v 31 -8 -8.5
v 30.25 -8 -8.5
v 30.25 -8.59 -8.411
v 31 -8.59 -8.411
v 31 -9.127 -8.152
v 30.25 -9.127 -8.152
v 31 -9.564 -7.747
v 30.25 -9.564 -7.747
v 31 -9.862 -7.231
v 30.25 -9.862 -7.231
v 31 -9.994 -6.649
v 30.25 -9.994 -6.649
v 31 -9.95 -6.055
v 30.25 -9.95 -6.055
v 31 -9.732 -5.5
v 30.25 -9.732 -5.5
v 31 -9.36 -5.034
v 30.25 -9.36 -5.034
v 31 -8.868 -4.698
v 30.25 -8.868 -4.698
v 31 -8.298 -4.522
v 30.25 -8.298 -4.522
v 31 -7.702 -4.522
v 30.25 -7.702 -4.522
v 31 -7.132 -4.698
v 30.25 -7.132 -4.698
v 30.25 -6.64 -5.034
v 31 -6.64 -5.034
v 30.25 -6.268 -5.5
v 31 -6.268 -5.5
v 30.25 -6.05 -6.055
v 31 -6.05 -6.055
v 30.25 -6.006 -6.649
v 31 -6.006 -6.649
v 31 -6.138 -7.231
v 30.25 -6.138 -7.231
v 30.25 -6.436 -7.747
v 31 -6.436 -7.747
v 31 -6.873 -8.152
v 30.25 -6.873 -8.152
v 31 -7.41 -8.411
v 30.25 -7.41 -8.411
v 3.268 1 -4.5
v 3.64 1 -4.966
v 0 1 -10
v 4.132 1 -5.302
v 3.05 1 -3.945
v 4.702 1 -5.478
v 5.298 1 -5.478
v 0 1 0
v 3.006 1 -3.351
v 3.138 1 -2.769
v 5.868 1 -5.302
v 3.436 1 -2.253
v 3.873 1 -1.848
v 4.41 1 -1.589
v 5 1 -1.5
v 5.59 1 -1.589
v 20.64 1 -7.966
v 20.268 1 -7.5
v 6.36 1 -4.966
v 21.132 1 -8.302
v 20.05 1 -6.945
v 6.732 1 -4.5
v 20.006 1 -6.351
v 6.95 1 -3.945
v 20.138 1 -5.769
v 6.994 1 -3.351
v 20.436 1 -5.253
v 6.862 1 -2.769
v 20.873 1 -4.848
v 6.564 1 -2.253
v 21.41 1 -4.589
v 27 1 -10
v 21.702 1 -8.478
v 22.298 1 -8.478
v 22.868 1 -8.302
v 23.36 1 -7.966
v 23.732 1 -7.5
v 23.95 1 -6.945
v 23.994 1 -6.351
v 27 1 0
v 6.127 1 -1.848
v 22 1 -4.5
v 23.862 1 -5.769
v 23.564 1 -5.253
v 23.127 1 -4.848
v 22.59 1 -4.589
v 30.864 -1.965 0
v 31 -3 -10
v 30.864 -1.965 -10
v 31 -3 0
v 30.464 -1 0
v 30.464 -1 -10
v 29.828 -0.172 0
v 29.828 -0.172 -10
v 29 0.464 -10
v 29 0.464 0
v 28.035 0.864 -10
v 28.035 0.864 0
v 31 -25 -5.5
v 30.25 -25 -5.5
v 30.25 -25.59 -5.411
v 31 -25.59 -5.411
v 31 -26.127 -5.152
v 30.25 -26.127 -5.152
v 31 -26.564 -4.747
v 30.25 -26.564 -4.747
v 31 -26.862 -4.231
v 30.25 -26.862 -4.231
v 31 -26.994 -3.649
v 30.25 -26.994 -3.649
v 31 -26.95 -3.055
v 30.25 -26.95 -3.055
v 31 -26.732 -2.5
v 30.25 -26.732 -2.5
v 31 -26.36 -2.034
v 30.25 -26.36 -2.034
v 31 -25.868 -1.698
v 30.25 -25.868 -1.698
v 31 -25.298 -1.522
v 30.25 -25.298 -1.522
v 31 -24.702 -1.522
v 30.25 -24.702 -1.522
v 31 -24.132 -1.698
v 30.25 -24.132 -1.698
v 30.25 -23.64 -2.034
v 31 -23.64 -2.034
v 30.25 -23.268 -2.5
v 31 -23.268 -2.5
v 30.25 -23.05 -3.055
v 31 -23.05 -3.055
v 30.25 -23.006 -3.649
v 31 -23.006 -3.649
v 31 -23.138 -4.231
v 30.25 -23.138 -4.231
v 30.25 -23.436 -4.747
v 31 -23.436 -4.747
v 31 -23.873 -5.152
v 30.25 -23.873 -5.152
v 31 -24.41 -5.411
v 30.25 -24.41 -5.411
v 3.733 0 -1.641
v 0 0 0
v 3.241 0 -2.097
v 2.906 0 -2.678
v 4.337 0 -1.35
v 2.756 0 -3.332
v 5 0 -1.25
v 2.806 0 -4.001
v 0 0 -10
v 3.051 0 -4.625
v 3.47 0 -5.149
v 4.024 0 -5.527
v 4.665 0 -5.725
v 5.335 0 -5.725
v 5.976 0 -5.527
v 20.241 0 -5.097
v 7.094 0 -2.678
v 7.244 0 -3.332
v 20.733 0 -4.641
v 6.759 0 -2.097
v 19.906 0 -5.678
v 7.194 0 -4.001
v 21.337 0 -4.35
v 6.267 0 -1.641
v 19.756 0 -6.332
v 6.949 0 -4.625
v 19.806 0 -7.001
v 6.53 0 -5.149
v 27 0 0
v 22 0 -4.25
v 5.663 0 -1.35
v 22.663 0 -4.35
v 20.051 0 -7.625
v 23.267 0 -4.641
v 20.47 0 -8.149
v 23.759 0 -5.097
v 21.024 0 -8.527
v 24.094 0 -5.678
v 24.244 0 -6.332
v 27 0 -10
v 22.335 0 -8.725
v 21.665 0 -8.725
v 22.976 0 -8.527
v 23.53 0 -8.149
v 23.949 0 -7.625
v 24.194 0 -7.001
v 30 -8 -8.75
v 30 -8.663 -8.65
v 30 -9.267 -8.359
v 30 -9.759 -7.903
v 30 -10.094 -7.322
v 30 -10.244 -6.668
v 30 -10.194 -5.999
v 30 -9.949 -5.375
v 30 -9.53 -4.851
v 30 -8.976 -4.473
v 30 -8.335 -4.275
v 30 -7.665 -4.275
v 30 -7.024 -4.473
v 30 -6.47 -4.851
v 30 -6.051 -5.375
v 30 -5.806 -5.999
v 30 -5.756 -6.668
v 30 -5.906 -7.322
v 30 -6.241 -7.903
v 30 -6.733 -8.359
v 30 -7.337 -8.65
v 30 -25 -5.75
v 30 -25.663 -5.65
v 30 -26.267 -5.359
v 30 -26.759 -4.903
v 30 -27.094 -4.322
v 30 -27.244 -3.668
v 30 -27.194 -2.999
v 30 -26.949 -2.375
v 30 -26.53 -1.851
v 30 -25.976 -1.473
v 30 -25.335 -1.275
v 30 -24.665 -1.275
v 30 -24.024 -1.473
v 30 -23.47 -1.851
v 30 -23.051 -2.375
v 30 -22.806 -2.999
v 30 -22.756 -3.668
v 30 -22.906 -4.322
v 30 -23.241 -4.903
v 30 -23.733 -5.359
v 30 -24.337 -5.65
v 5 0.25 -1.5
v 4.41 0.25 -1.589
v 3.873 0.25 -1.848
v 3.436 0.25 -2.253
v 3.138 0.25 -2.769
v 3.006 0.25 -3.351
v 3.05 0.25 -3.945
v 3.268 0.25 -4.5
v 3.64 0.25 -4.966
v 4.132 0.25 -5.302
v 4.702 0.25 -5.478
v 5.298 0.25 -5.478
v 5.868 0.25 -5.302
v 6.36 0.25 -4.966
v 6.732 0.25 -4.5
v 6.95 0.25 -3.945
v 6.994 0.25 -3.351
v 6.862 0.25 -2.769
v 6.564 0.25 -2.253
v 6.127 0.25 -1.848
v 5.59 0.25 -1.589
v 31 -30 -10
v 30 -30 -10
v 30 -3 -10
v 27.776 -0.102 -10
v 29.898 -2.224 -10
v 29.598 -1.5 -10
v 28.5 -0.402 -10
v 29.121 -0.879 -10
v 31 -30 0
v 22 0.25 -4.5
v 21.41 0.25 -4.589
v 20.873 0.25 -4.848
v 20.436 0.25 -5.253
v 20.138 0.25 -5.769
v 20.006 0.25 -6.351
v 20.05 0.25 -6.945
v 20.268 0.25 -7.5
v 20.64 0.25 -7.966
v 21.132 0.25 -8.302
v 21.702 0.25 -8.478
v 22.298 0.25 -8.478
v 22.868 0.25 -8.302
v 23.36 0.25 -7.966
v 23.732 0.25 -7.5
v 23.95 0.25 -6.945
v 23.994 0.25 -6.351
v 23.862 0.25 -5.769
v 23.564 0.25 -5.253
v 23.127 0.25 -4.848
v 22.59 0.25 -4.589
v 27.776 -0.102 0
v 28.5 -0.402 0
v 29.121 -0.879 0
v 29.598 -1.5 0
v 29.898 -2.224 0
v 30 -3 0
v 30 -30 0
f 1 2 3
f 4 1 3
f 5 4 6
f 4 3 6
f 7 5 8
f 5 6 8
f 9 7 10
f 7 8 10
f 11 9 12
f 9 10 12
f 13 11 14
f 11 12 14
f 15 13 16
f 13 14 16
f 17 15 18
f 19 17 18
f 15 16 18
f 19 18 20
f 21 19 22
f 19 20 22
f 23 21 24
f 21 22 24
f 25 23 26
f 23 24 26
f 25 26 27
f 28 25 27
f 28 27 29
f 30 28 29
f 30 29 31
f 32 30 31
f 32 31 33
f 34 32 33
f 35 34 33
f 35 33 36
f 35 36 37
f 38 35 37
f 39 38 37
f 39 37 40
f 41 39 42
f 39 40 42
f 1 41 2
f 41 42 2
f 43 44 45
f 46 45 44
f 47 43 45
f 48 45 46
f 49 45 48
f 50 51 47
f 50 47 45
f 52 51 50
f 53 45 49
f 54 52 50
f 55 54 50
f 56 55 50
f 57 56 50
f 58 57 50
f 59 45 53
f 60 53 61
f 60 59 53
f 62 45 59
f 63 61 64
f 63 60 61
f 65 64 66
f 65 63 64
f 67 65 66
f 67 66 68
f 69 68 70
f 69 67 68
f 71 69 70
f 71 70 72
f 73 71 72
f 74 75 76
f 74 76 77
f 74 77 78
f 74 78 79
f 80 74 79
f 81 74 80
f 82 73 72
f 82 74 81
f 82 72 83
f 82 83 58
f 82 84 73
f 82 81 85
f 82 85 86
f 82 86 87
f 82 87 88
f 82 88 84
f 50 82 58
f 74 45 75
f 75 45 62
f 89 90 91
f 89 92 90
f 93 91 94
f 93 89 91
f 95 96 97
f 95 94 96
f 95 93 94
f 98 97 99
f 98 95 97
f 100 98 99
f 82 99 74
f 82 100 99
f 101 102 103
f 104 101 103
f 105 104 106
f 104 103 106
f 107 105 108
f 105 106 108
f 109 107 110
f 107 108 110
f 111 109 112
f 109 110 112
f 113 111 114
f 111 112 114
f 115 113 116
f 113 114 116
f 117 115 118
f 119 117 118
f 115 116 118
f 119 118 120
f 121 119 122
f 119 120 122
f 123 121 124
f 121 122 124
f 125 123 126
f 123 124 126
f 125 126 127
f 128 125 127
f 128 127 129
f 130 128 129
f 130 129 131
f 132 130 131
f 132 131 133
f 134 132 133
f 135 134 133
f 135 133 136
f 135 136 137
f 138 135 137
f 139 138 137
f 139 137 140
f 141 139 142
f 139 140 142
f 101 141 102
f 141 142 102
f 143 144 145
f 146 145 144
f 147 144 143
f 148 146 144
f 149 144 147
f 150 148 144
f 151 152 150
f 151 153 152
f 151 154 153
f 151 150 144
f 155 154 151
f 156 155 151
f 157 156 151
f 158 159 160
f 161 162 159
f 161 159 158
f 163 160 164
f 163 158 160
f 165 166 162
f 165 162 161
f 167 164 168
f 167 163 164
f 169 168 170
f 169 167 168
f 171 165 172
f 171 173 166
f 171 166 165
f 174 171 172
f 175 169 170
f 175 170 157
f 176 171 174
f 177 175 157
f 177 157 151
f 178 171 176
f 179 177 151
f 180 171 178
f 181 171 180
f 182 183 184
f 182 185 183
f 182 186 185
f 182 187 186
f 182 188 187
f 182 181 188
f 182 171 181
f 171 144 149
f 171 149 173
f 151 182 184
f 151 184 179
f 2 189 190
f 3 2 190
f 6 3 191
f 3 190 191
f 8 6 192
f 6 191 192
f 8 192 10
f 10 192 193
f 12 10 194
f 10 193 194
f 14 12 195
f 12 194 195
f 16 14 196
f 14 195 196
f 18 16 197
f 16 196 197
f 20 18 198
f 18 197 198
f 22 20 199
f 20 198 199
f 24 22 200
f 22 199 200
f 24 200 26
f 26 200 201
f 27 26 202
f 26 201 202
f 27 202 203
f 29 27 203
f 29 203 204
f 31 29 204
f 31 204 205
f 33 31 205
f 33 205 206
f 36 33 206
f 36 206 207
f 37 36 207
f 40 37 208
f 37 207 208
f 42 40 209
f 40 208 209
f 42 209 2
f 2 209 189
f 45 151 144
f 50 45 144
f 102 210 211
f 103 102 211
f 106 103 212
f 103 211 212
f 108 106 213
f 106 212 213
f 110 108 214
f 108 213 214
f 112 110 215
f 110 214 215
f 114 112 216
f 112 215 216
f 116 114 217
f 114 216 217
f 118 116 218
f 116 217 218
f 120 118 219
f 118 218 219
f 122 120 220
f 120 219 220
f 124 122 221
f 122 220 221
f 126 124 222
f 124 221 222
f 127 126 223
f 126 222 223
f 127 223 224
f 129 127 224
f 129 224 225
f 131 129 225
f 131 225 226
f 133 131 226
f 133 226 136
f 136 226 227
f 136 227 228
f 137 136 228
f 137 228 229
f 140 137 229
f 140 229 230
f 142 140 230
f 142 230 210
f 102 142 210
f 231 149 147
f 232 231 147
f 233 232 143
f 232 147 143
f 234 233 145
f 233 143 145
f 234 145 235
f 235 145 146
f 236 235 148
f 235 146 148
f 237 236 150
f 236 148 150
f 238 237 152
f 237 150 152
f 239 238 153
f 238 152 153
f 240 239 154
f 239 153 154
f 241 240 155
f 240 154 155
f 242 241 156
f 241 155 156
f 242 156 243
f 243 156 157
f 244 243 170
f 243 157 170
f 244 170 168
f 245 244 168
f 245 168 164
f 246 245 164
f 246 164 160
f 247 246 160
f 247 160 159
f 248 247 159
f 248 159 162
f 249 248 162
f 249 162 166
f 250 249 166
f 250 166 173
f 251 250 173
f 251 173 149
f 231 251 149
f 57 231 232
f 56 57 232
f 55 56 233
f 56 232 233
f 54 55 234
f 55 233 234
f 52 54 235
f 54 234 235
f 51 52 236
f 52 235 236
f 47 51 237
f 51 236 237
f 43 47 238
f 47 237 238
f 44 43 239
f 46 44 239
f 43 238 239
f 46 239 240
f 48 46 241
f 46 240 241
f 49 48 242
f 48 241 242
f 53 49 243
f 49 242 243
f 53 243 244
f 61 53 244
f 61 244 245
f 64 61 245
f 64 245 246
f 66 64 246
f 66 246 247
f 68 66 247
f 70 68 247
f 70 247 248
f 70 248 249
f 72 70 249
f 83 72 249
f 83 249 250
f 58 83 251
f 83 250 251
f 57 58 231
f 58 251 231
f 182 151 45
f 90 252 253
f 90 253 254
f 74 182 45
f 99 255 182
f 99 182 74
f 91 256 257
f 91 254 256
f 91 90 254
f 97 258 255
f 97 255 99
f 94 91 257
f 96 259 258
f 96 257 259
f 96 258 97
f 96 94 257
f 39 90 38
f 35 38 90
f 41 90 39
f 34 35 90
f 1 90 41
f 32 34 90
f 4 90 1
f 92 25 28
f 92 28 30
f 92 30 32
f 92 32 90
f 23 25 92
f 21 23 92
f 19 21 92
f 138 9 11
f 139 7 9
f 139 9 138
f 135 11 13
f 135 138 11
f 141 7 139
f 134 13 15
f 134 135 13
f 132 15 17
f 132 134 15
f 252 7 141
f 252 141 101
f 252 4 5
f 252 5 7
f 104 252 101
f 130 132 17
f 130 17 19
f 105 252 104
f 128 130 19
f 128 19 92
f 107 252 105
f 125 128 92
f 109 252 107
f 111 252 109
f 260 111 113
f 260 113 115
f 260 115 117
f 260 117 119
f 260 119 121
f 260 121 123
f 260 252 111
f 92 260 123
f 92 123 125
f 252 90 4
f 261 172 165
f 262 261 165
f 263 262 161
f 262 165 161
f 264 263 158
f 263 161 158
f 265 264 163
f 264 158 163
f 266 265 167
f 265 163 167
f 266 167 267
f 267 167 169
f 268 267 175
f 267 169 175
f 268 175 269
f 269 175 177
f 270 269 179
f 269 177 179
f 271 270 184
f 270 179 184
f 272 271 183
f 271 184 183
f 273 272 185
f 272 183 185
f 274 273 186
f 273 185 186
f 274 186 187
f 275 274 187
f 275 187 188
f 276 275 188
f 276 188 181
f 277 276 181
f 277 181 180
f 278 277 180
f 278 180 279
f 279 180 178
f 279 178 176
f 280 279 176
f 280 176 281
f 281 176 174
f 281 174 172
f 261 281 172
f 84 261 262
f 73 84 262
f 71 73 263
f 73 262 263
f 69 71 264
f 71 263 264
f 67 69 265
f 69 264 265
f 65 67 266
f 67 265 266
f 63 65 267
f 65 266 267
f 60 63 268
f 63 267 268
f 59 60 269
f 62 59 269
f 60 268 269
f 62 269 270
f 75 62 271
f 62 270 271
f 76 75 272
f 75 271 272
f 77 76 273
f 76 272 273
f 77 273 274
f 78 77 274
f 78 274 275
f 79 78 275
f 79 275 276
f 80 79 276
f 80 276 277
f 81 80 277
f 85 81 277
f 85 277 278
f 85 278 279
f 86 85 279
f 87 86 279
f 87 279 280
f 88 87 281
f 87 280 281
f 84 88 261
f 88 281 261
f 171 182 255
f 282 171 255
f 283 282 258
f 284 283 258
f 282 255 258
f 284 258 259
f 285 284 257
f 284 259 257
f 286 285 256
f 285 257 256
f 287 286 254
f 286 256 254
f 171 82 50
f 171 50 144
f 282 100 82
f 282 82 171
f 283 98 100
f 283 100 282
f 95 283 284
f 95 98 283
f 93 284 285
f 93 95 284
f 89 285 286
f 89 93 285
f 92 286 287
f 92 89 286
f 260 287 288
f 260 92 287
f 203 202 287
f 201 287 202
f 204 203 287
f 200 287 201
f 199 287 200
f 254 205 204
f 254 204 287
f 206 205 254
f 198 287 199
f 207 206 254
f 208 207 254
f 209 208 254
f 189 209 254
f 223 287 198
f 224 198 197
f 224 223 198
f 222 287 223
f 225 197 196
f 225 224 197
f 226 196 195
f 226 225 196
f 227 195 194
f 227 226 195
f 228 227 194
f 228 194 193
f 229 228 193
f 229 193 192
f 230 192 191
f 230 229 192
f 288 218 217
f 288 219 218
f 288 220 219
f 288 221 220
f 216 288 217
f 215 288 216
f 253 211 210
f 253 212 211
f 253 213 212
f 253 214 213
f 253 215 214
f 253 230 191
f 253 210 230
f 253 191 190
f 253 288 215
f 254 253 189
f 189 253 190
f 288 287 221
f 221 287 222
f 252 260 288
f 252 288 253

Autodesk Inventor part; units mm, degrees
ref_plane "YZ Plane" through (0, 0, 0) normal (1, 0, 0) x (0, 1, 0)
ref_plane "XZ Plane" through (0, 0, 0) normal (0, 1, 0) x (-1, 0, 0)
ref_plane "XY Plane" through (0, 0, 0) normal (0, 0, 1) x (1, 0, 0)
sketch "Sketch1" plane through (0, 0, 0) normal (0, 0, 1) x (1, 0, 0)
  line L0 (0, 0) -> (27, 0)
  line L1 (30, -3) -> (30, -30)
  arc A0 (30, -3) -> (27, 0) centre (27, -3) ccw
  point P0 (30, 0)
  dimension "d0" = 30
  dimension "d1" = 30
  dimension "d7" = 3
sketch "Sketch2" plane through (0, 0, 0) normal (1, 0, 0) x (0, 1, 0)
  line L0 (0, 0) -> (0, -10)
  line L1 (0, -10) -> (1, -10)
  line L2 (1, -10) -> (1, 0)
  line L3 (1, 0) -> (0, 0)
  dimension "d2" = 10
  dimension "d3" = 1
  dimension "d4" = 10
sweep "Sweep1" add profiles "Sketch2" path "Sketch1"
hole "Hole1" at (5, 1, -3.5) direction (0, -1, 0) diameter 4 end through all
hole "Hole2" at (22, 1, -6.5) direction (0, -1, 0) diameter 4 end through all
hole "Hole3" at (31, -8, -6.5) direction (-1, 0, 0) diameter 4 end through all
hole "Hole4" at (31, -25, -3.5) direction (-1, 0, 0) diameter 4 end through all
chamfer "Chamfer1" distance 0.25 angle 45 4 edges at (5, 0, -5.5) (22, 0, -8.5) (30, -8, -4.5) (30, -25, -1.5)
properties part number "30mmCornerBracket"
